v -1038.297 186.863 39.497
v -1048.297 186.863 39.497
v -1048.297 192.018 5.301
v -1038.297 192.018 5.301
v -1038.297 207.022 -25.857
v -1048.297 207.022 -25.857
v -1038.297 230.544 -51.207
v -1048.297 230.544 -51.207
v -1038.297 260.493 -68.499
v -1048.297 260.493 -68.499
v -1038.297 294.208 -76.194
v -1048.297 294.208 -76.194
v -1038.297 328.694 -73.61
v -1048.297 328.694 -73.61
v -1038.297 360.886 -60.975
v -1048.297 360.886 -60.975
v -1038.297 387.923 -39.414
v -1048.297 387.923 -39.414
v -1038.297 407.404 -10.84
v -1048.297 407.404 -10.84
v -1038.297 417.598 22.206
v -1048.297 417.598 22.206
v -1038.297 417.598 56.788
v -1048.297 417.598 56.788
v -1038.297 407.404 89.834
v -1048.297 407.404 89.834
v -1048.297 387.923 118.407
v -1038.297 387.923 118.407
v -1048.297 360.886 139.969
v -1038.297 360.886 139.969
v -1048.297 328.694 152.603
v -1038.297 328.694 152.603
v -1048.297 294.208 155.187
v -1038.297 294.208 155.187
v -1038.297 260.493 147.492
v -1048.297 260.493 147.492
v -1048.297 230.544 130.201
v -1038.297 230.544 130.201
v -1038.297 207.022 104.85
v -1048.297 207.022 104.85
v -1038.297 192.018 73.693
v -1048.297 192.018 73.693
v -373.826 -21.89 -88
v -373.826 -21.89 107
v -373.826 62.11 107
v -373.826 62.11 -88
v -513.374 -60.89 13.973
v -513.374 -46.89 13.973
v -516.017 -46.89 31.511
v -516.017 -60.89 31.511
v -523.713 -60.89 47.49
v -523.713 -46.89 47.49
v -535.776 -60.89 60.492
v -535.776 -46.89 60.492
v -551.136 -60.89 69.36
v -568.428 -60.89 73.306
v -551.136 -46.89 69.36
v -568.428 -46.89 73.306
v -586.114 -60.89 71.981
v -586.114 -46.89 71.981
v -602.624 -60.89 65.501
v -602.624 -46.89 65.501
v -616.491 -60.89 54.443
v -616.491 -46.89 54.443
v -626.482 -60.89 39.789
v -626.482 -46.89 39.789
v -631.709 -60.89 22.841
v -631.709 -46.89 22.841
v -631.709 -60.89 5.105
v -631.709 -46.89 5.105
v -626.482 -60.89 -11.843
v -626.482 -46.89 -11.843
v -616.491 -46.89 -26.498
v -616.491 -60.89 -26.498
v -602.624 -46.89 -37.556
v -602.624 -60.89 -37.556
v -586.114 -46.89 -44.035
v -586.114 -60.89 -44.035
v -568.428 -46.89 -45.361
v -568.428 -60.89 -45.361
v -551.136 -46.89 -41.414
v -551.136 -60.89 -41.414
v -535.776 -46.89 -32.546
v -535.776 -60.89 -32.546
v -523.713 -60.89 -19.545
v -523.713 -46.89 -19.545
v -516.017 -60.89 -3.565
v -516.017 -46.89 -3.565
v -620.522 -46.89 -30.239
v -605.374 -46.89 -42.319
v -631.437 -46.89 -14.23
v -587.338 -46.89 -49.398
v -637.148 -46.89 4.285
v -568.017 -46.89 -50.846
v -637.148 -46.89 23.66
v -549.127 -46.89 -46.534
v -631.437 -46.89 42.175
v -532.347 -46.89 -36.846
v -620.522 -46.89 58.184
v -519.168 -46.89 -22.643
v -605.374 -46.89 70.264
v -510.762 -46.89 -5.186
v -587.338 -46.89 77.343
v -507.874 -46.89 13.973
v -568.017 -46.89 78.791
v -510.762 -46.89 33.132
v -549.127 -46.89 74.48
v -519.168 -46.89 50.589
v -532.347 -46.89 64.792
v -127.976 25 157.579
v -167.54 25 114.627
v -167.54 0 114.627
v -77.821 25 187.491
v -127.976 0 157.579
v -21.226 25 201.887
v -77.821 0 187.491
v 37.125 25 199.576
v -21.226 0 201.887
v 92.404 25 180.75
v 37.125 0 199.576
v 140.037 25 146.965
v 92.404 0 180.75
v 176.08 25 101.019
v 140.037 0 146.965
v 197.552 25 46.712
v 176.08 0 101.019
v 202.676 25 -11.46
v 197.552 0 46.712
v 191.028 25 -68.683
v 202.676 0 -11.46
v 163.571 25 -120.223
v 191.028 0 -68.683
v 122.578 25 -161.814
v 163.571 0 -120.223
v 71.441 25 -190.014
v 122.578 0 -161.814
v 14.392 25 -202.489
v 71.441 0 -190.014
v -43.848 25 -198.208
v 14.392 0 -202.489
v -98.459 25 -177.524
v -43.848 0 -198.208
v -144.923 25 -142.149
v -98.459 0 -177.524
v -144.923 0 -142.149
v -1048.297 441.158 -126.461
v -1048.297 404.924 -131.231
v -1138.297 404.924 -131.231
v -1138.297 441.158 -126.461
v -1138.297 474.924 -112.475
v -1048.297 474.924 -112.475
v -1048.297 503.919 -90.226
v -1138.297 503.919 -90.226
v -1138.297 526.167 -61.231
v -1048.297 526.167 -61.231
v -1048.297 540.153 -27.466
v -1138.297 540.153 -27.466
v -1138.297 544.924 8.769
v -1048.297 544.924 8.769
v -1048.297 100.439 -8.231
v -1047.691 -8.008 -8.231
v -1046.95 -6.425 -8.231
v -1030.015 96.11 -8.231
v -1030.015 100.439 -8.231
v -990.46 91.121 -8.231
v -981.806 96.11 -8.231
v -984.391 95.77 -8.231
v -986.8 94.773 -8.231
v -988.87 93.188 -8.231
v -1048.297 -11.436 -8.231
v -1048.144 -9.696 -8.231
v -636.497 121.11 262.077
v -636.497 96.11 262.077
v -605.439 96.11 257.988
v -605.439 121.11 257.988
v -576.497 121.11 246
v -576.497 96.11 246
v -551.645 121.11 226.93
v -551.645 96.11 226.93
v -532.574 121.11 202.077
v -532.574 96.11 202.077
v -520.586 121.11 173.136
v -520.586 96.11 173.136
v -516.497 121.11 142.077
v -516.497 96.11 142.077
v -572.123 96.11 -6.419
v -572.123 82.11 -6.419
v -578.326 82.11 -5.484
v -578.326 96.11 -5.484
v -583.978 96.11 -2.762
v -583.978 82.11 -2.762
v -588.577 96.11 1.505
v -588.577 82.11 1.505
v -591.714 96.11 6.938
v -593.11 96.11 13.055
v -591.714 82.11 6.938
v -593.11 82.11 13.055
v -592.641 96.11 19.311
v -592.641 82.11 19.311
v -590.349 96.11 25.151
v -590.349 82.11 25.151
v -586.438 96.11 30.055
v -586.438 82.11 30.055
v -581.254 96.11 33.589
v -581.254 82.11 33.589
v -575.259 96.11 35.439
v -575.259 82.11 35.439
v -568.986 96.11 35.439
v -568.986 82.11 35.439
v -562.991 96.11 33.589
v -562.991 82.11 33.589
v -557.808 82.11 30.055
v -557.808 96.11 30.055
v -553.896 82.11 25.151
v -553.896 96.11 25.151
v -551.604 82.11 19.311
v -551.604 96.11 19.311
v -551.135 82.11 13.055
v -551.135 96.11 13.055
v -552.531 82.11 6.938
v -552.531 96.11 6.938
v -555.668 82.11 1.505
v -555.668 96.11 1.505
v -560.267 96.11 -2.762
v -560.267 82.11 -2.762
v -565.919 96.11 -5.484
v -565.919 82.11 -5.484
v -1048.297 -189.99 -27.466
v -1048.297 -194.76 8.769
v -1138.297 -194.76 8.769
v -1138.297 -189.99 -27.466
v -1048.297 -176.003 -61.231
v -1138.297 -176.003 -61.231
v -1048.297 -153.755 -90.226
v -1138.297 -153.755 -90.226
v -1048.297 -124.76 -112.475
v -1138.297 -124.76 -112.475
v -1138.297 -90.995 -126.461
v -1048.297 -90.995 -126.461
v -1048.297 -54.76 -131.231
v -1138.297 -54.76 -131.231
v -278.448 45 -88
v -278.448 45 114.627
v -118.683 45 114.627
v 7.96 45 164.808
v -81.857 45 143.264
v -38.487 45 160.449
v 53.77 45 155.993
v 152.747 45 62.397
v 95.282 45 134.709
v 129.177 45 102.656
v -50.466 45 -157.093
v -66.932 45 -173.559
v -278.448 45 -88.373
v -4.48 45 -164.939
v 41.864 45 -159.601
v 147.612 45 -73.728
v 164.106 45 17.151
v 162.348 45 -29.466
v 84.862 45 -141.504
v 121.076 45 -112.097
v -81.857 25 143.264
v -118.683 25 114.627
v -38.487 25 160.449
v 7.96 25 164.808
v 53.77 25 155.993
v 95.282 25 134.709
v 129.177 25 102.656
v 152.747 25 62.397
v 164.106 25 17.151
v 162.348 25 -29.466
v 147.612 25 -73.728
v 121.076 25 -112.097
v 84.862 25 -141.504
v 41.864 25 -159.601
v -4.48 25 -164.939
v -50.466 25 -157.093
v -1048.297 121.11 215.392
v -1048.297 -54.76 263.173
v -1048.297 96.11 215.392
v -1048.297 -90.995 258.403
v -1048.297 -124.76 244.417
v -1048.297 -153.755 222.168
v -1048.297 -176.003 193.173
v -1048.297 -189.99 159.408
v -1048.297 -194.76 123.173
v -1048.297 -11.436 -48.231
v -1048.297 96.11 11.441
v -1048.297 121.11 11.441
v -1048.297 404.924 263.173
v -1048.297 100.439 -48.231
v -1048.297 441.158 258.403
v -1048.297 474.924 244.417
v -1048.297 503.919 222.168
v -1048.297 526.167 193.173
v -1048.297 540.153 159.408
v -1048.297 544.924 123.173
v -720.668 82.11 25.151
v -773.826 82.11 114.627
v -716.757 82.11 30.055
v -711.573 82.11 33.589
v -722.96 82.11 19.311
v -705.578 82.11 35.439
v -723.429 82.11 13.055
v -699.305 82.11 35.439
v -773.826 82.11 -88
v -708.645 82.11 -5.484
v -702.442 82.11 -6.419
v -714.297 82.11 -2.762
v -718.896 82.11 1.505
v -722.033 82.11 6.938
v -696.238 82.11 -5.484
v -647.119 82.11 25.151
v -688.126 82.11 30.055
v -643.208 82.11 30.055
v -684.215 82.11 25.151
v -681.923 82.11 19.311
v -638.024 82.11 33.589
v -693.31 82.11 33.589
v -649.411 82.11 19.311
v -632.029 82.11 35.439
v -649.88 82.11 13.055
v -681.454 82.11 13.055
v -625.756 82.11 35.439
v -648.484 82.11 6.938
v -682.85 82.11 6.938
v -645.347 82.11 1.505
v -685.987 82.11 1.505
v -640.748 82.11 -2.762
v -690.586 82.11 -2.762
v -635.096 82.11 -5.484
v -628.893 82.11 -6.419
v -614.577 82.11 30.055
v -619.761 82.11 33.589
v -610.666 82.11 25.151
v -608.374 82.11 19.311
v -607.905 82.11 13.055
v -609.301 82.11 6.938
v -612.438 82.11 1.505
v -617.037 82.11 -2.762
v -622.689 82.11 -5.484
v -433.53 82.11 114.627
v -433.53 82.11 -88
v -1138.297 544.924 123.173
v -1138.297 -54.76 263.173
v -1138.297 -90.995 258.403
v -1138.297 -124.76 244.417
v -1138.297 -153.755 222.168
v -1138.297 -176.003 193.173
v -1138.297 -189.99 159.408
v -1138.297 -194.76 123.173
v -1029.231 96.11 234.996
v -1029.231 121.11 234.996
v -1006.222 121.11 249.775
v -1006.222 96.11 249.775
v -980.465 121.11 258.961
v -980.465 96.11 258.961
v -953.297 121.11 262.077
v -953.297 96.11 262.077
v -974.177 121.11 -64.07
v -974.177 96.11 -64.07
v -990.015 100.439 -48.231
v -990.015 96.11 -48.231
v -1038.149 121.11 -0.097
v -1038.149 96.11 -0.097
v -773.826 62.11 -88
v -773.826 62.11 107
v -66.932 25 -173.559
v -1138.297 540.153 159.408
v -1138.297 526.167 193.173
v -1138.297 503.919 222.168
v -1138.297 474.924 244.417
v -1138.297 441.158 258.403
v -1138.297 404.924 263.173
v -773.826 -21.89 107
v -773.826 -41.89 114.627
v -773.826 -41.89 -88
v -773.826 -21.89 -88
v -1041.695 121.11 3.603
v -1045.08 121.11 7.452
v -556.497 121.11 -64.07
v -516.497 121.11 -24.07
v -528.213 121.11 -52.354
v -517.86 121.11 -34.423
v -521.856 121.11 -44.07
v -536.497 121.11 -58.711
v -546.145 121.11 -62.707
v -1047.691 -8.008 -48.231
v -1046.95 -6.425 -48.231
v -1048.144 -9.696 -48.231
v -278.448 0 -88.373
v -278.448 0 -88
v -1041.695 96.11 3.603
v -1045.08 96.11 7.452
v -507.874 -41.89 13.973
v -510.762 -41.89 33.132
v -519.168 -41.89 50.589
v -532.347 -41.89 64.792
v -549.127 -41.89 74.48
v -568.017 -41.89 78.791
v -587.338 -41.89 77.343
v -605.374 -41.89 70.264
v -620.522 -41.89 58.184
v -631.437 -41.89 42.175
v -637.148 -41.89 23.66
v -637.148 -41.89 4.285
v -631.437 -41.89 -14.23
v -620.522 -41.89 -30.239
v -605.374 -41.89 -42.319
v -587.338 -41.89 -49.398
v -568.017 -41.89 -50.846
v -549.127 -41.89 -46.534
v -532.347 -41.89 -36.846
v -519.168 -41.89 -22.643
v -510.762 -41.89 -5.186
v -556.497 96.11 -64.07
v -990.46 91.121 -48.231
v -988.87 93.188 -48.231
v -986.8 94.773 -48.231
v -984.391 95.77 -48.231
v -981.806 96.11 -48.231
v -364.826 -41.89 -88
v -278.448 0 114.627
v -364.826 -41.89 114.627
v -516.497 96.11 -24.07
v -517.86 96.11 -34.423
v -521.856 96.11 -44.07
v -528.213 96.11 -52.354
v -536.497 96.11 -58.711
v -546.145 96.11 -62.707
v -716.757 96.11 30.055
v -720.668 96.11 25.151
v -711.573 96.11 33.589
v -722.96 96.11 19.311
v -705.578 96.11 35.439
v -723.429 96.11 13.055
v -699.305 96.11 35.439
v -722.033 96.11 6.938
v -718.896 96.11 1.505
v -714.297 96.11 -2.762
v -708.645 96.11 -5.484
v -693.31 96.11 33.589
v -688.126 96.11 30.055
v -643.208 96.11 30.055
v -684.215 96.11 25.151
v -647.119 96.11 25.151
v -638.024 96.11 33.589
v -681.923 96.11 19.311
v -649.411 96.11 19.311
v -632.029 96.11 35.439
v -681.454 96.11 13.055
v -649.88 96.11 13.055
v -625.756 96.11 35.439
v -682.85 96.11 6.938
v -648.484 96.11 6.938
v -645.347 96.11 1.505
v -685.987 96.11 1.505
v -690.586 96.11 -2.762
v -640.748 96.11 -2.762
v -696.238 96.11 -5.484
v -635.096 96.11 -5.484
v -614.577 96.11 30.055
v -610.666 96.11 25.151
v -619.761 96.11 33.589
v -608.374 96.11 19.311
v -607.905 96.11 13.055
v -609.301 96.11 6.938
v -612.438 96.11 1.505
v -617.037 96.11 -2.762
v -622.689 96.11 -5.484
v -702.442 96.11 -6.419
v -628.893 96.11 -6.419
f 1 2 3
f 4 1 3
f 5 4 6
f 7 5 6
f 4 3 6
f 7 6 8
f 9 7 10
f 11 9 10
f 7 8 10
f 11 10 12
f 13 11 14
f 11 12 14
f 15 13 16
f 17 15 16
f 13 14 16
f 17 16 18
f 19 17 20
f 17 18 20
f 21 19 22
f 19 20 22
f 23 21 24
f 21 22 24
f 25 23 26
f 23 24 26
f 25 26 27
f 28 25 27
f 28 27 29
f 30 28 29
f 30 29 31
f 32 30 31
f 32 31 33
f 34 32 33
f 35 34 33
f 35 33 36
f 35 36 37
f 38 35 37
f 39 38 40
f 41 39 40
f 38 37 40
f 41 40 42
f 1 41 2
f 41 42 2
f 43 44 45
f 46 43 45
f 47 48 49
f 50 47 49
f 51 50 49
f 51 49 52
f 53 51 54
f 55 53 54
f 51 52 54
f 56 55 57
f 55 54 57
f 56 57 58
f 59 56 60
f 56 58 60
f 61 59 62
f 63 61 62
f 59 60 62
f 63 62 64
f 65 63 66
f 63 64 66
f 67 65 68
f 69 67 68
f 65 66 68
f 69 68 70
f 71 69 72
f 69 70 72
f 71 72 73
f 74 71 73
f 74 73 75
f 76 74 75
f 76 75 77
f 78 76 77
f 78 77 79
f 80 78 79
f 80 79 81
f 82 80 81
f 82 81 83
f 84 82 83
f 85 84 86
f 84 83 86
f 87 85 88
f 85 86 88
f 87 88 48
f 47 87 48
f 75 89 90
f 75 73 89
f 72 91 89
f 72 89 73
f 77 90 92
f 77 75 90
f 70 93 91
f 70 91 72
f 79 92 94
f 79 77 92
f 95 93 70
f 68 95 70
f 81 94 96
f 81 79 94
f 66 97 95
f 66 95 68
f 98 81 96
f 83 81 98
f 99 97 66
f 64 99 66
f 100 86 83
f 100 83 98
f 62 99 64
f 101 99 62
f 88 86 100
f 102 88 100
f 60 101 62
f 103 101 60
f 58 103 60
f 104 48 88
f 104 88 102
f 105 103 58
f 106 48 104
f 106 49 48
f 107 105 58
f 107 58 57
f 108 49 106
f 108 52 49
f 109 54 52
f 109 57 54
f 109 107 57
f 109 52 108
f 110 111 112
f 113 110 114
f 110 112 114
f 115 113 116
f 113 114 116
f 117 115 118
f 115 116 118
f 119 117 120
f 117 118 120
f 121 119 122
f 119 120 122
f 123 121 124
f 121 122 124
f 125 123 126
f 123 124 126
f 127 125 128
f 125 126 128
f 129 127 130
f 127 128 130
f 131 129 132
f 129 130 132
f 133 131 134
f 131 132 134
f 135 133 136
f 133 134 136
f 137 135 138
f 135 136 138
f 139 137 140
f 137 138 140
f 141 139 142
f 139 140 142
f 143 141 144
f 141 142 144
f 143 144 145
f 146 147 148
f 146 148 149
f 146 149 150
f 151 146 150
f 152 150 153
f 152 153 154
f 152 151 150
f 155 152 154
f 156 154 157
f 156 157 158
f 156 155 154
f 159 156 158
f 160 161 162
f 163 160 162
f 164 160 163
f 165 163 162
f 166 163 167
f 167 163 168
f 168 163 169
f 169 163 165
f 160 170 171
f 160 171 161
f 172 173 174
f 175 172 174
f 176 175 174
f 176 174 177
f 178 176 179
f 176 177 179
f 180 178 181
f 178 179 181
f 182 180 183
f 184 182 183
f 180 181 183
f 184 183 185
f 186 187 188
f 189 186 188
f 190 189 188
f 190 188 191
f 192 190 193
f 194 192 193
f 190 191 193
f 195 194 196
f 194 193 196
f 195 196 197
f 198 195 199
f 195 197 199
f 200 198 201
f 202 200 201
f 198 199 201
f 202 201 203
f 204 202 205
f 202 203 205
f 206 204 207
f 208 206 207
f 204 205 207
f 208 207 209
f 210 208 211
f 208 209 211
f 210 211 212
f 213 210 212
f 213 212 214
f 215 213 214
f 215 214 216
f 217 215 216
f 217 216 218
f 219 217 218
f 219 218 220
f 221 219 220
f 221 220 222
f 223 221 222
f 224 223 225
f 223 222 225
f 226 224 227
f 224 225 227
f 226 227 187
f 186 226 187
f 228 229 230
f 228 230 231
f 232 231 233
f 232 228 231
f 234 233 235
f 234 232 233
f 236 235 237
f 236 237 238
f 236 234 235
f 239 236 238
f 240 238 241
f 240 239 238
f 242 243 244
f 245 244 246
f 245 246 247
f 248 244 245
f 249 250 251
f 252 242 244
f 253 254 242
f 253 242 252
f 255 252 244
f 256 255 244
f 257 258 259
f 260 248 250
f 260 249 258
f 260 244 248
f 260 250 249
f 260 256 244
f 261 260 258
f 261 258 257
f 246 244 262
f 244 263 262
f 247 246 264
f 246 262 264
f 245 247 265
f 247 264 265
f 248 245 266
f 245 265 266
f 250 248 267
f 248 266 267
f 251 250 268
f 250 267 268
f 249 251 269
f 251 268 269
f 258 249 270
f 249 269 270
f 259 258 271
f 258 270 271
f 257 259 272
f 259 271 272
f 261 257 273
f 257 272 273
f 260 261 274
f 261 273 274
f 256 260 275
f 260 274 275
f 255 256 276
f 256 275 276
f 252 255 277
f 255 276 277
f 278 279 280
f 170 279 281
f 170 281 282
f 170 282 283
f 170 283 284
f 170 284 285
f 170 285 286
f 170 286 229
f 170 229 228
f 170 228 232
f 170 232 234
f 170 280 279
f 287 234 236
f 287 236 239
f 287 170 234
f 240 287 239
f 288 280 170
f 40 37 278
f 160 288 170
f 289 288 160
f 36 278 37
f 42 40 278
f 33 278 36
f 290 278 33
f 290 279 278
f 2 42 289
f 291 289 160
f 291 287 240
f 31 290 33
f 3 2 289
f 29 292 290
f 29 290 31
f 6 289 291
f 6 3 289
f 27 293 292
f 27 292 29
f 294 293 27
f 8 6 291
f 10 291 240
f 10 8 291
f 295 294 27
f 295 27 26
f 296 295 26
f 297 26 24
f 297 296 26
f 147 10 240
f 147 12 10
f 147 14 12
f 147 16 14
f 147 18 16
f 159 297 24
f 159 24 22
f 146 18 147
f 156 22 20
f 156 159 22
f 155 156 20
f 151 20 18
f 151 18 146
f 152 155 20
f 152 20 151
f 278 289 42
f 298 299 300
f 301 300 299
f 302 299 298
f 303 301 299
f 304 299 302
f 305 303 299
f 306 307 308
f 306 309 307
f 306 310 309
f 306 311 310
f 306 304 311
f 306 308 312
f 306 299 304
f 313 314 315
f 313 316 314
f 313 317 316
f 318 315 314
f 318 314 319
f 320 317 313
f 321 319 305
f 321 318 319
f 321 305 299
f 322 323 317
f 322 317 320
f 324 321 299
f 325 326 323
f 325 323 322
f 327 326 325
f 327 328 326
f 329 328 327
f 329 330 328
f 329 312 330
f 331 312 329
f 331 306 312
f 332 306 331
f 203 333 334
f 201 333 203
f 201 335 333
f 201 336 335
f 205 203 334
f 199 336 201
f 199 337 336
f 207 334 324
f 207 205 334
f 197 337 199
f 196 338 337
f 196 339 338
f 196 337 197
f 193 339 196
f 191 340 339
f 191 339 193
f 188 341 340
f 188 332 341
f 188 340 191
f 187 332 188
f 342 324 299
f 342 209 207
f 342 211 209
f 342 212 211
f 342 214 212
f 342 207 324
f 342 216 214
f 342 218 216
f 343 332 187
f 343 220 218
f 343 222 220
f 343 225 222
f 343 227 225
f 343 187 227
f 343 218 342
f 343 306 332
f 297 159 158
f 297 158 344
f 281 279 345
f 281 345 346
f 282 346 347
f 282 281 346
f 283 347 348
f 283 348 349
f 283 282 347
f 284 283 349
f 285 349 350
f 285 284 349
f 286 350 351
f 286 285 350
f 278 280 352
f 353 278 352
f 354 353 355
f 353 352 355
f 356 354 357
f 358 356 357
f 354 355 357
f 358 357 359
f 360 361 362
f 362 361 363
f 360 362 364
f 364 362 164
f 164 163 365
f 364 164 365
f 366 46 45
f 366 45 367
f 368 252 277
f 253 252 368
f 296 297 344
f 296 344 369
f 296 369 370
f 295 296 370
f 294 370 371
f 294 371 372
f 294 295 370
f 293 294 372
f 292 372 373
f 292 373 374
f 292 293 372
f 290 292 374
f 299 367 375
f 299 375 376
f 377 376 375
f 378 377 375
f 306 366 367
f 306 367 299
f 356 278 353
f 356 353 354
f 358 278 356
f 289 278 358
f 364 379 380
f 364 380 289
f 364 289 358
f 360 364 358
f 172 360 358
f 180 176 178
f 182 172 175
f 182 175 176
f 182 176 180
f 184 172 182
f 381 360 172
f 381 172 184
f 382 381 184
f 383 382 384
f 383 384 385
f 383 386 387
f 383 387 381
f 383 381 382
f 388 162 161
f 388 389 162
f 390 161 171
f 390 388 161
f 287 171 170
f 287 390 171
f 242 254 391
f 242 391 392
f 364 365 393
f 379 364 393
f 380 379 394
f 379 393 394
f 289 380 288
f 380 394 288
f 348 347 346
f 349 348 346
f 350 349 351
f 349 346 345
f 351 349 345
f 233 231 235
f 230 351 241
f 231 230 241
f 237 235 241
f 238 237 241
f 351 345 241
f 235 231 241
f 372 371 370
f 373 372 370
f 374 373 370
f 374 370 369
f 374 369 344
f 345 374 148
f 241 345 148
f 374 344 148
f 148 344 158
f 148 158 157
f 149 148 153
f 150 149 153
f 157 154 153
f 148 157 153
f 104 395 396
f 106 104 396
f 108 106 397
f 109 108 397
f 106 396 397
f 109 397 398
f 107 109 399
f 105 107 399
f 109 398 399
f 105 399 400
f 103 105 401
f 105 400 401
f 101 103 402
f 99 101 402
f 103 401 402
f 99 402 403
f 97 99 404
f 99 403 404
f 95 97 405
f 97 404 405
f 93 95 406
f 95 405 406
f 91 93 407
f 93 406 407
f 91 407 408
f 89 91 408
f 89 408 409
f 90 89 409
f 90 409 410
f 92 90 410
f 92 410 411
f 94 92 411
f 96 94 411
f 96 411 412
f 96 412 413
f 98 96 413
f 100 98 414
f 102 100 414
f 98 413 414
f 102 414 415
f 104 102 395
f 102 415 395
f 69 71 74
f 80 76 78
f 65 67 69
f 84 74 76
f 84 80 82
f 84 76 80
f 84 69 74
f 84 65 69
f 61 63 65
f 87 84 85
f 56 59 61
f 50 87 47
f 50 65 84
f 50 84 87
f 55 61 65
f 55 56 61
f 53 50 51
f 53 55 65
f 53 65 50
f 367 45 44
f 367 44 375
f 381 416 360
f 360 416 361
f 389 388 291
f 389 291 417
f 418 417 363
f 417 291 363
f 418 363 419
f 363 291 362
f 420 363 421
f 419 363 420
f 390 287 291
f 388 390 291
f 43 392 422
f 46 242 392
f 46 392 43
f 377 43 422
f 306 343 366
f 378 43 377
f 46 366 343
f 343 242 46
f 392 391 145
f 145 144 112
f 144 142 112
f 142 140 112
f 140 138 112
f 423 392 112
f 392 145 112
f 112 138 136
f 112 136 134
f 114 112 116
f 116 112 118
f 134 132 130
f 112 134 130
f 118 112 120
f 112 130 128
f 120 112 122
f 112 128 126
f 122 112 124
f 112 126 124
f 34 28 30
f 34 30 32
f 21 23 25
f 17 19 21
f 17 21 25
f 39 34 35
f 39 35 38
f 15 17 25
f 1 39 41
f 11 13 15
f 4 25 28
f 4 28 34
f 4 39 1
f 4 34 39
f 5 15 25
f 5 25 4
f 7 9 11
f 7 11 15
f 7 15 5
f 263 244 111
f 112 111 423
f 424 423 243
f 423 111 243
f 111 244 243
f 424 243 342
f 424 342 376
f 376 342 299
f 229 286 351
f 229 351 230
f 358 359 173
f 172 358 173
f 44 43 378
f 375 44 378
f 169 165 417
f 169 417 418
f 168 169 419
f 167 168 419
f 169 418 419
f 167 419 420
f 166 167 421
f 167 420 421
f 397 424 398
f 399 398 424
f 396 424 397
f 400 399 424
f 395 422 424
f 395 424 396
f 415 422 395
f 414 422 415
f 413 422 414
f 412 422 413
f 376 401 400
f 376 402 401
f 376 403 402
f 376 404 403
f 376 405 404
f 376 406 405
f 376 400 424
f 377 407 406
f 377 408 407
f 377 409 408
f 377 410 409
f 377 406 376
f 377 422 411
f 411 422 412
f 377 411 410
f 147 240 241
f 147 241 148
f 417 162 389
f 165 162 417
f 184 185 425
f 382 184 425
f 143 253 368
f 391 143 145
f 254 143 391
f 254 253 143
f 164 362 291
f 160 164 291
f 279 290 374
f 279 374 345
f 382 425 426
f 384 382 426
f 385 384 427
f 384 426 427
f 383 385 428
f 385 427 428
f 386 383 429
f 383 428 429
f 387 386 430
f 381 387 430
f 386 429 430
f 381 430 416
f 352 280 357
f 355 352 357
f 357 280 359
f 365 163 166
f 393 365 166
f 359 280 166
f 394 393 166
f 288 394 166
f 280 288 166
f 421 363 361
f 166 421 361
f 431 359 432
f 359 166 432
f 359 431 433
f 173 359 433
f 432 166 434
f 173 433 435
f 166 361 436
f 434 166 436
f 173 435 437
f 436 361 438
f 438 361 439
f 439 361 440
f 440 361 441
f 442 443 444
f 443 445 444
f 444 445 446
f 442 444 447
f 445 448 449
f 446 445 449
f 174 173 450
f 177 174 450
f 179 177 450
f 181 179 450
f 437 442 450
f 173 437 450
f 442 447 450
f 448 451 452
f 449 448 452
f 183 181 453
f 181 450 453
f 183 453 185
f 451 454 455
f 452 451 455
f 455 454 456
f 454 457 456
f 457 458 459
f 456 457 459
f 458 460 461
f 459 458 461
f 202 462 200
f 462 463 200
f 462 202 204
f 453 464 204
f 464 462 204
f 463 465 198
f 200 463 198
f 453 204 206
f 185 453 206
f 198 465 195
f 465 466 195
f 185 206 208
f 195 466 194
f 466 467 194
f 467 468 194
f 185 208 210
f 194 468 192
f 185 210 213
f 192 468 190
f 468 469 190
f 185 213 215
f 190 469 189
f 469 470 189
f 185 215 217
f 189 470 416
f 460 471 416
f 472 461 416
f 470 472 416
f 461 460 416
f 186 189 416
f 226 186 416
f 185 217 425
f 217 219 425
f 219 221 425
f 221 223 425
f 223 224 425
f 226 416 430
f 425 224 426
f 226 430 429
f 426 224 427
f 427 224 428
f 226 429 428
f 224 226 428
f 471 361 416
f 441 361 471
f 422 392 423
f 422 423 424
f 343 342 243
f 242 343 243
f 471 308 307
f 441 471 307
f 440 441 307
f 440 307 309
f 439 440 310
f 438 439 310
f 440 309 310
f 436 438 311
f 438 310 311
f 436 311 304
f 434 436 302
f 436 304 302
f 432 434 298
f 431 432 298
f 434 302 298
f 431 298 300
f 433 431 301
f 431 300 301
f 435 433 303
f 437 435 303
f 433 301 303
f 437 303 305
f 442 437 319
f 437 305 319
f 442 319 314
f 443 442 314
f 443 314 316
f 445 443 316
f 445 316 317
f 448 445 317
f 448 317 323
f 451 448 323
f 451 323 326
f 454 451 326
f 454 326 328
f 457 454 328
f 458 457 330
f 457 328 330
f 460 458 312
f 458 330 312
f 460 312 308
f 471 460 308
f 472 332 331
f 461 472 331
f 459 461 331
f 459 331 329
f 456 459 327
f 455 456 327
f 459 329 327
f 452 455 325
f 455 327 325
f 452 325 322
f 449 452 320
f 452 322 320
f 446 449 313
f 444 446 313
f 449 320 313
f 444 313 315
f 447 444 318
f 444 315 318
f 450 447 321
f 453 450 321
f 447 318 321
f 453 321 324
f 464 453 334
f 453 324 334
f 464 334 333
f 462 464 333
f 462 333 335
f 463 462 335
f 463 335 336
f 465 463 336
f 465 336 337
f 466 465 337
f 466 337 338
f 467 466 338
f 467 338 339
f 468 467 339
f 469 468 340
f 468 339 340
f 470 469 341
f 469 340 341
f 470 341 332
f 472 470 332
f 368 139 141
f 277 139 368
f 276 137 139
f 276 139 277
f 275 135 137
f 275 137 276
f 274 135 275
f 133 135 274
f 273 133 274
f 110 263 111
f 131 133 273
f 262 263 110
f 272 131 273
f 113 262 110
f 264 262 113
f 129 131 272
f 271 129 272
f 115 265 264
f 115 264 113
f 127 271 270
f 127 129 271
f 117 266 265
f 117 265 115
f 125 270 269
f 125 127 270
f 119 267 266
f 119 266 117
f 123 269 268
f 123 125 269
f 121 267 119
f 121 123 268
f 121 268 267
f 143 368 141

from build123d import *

# Parameters (mm, degrees)
SKETCH2_R                 = 203
BOSS_EXTRUDE1_DEPTH       = 25
SKETCH3_R                 = 165
BOSS_EXTRUDE4_DEPTH       = 20
BOSS_EXTRUDE6_DEPTH       = 45
BOSS_EXTRUDE7_DEPTH       = 202.626802206
SKETCH12_W                = 400
SKETCH12_H                = 84
CUT_EXTRUDE2_DEPTH        = 195
SKETCH13_R                = 65
BOSS_EXTRUDE8_DEPTH       = 5
SKETCH14_R                = 59.5
BOSS_EXTRUDE9_DEPTH       = 14
SKETCH15_R                = 21.046280496
BOSS_EXTRUDE10_DEPTH      = 14
BOSS_EXTRUDE11_DEPTH      = 25
BOSS_EXTRUDE12_DEPTH      = 65
BOSS_EXTRUDE12_DEPTH_BACK = 25
BOSS_EXTRUDE13_DEPTH      = 25
BOSS_EXTRUDE13_DEPTH_BACK = 15
FILLET1_R                 = 10
SKETCH20_R                = 116.015
BOSS_EXTRUDE14_DEPTH      = 10


with BuildPart() as part:
    # Sketch2 → Boss-Extrude1 (new body)
    with BuildSketch(Plane(origin=(0, 0, 0), x_dir=(1, 0, 0), z_dir=(0, 1, 0))):
        with Locations(Location((0, 0, 0), (0, 0, 270))):
            Circle(SKETCH2_R)
    extrude(amount=BOSS_EXTRUDE1_DEPTH)

    # Sketch3 → Boss-Extrude4 (add)
    with BuildSketch(Plane(origin=(0, 25, 0), x_dir=(1, 0, 0), z_dir=(0, 1, 0))):
        with Locations(Location((0, 0, 0), (0, 0, 270))):
            Circle(SKETCH3_R)
    extrude(amount=BOSS_EXTRUDE4_DEPTH)

    # Sketch8 → Boss-Extrude6 (add)
    with BuildSketch(Plane(origin=(0, 45, 0), x_dir=(1, 0, 0), z_dir=(0, 1, 0))):
        Polygon((-36.218523686, 88.373197794), (-36.218523686, 142.845857418), (-66.931831772, 173.559165504), (-278.448010099, 88.373197794), (-278.448010099, -114.626802206), (-36.218523686, -114.626802206), align=None)
    extrude(amount=-BOSS_EXTRUDE6_DEPTH)

    # Sketch11 → Boss-Extrude7 (add)
    with BuildSketch(Plane.XY.offset(-88)):
        Polygon((-278.448010099, 0), (-364.82630567, -41.890214301), (-773.82630567, -41.890214301), (-773.82630567, 82.109785699), (-433.530139449, 82.109785699), (-278.448010099, 45), align=None)
    extrude(amount=BOSS_EXTRUDE7_DEPTH)

    # Sketch12 → Cut-Extrude2 (cut)
    with BuildSketch(Plane(origin=(0, 0, -88), x_dir=(-1, 0, 0), z_dir=(0, 0, -1))):
        with Locations((573.82630567, 20.109785699)):
            Rectangle(SKETCH12_W, SKETCH12_H)
    extrude(amount=-CUT_EXTRUDE2_DEPTH, mode=Mode.SUBTRACT)

    # Sketch13 → Boss-Extrude8 (add)
    with BuildSketch(Plane.XZ.offset(41.890214301)):
        with Locations((-572.873962689, 13.972710812)):
            Circle(SKETCH13_R)
    extrude(amount=BOSS_EXTRUDE8_DEPTH)

    # Sketch14 → Boss-Extrude9 (add)
    with BuildSketch(Plane.XZ.offset(46.890214301)):
        with Locations((-572.873962689, 13.972710812)):
            Circle(SKETCH14_R)
    extrude(amount=BOSS_EXTRUDE9_DEPTH)

    # Sketch15 → Boss-Extrude10 (add)
    with BuildSketch(Plane(origin=(0, 82.109785699, 0), x_dir=(1, 0, 0), z_dir=(0, 1, 0))):
        with Locations(Location((-702.441522293, -14.627430099, 0), (0, 0, 90))):
            Circle(SKETCH15_R)
        with Locations(Location((-628.892568706, -14.627430099, 0), (0, 0, 90))):
            Circle(SKETCH15_R)
        with Locations(Location((-572.1226233, -14.627430099, 0), (0, 0, 90))):
            Circle(SKETCH15_R)
    extrude(amount=BOSS_EXTRUDE10_DEPTH)

    # Sketch16 → Boss-Extrude11 (add)
    with BuildSketch(Plane(origin=(0, 96.109785699, 0), x_dir=(1, 0, 0), z_dir=(0, 1, 0))):
        with BuildLine():
            Line((-556.497428598, 64.069909455), (-974.176536307, 64.069909455))
            Line((-974.176536307, 64.069909455), (-1038.149417409, 0.097028353))
            ThreePointArc((-1038.149417409, 0.097028353), (-1064.162147568, -38.833773506), (-1073.296603667, -84.75578539))
            Line((-1073.296603667, -84.75578539), (-1073.296603667, -142.077234659))
            ThreePointArc((-1073.296603667, -142.077234659), (-1038.149417409, -226.930048402), (-953.296603667, -262.077234659))
            Line((-953.296603667, -262.077234659), (-636.497428598, -262.077234659))
            ThreePointArc((-636.497428598, -262.077234659), (-551.644614856, -226.930048402), (-516.497428598, -142.077234659))
            Line((-516.497428598, -142.077234659), (-516.497428598, 24.069909455))
            ThreePointArc((-516.497428598, 24.069909455), (-528.213157351, 52.354180702), (-556.497428598, 64.069909455))
        make_face()
    extrude(amount=BOSS_EXTRUDE11_DEPTH)

    # Sketch17 → Boss-Extrude12 (add, two sides: drawn at the far end of the back side and taken through both)
    with BuildSketch(Plane.ZY.offset(1073.296603667).offset(-BOSS_EXTRUDE12_DEPTH_BACK)):
        with BuildLine():
            Line((8.768612392, 544.923564191), (123.173449264, 544.923564191))
            ThreePointArc((123.173449264, 544.923564191), (222.16839863, 503.918513558), (263.173449264, 404.923564191))
            Line((263.173449264, 404.923564191), (263.173449264, -54.759891123))
            ThreePointArc((263.173449264, -54.759891123), (222.16839863, -153.754840489), (123.173449264, -194.759891123))
            Line((123.173449264, -194.759891123), (8.768612392, -194.759891123))
            ThreePointArc((8.768612392, -194.759891123), (-90.226336974, -153.754840489), (-131.231387608, -54.759891123))
            Line((-131.231387608, -54.759891123), (-131.231387608, 404.923564191))
            ThreePointArc((-131.231387608, 404.923564191), (-90.226336974, 503.918513558), (8.768612392, 544.923564191))
        make_face()
    extrude(amount=BOSS_EXTRUDE12_DEPTH + BOSS_EXTRUDE12_DEPTH_BACK)

    # Sketch19 → Boss-Extrude13 (add, two sides: drawn at the far end of the back side and taken through both)
    with BuildSketch(Plane(origin=(0, 0, -23.231387608), x_dir=(-1, 0, 0), z_dir=(0, 0, -1)).offset(-BOSS_EXTRUDE13_DEPTH_BACK)):
        Polygon((1052.931156926, -16.752524753), (985.063520649, 100.43883668), (1052.931156926, 100.43883668), align=None)
    extrude(amount=BOSS_EXTRUDE13_DEPTH + BOSS_EXTRUDE13_DEPTH_BACK)

    # Fillet1
    fillet1_edges = [part.edges().sort_by_distance(p)[0] for p in [
        (-1048.296603667, -8.749747053, -28.231387608),
        (-987.570552343, 96.109785699, -28.231387608),
    ]]
    fillet(fillet1_edges, radius=FILLET1_R)

    # Sketch20 → Boss-Extrude14 (add)
    with BuildSketch(Plane(origin=(-1048.296603667, 0, 0), x_dir=(0, 0, -1), z_dir=(1, 0, 0))):
        with Locations(Location((-39.49671875, 302.878292984, 0), (0, 0, 270))):
            Circle(SKETCH20_R)
    extrude(amount=BOSS_EXTRUDE14_DEPTH)


solid = part.part
